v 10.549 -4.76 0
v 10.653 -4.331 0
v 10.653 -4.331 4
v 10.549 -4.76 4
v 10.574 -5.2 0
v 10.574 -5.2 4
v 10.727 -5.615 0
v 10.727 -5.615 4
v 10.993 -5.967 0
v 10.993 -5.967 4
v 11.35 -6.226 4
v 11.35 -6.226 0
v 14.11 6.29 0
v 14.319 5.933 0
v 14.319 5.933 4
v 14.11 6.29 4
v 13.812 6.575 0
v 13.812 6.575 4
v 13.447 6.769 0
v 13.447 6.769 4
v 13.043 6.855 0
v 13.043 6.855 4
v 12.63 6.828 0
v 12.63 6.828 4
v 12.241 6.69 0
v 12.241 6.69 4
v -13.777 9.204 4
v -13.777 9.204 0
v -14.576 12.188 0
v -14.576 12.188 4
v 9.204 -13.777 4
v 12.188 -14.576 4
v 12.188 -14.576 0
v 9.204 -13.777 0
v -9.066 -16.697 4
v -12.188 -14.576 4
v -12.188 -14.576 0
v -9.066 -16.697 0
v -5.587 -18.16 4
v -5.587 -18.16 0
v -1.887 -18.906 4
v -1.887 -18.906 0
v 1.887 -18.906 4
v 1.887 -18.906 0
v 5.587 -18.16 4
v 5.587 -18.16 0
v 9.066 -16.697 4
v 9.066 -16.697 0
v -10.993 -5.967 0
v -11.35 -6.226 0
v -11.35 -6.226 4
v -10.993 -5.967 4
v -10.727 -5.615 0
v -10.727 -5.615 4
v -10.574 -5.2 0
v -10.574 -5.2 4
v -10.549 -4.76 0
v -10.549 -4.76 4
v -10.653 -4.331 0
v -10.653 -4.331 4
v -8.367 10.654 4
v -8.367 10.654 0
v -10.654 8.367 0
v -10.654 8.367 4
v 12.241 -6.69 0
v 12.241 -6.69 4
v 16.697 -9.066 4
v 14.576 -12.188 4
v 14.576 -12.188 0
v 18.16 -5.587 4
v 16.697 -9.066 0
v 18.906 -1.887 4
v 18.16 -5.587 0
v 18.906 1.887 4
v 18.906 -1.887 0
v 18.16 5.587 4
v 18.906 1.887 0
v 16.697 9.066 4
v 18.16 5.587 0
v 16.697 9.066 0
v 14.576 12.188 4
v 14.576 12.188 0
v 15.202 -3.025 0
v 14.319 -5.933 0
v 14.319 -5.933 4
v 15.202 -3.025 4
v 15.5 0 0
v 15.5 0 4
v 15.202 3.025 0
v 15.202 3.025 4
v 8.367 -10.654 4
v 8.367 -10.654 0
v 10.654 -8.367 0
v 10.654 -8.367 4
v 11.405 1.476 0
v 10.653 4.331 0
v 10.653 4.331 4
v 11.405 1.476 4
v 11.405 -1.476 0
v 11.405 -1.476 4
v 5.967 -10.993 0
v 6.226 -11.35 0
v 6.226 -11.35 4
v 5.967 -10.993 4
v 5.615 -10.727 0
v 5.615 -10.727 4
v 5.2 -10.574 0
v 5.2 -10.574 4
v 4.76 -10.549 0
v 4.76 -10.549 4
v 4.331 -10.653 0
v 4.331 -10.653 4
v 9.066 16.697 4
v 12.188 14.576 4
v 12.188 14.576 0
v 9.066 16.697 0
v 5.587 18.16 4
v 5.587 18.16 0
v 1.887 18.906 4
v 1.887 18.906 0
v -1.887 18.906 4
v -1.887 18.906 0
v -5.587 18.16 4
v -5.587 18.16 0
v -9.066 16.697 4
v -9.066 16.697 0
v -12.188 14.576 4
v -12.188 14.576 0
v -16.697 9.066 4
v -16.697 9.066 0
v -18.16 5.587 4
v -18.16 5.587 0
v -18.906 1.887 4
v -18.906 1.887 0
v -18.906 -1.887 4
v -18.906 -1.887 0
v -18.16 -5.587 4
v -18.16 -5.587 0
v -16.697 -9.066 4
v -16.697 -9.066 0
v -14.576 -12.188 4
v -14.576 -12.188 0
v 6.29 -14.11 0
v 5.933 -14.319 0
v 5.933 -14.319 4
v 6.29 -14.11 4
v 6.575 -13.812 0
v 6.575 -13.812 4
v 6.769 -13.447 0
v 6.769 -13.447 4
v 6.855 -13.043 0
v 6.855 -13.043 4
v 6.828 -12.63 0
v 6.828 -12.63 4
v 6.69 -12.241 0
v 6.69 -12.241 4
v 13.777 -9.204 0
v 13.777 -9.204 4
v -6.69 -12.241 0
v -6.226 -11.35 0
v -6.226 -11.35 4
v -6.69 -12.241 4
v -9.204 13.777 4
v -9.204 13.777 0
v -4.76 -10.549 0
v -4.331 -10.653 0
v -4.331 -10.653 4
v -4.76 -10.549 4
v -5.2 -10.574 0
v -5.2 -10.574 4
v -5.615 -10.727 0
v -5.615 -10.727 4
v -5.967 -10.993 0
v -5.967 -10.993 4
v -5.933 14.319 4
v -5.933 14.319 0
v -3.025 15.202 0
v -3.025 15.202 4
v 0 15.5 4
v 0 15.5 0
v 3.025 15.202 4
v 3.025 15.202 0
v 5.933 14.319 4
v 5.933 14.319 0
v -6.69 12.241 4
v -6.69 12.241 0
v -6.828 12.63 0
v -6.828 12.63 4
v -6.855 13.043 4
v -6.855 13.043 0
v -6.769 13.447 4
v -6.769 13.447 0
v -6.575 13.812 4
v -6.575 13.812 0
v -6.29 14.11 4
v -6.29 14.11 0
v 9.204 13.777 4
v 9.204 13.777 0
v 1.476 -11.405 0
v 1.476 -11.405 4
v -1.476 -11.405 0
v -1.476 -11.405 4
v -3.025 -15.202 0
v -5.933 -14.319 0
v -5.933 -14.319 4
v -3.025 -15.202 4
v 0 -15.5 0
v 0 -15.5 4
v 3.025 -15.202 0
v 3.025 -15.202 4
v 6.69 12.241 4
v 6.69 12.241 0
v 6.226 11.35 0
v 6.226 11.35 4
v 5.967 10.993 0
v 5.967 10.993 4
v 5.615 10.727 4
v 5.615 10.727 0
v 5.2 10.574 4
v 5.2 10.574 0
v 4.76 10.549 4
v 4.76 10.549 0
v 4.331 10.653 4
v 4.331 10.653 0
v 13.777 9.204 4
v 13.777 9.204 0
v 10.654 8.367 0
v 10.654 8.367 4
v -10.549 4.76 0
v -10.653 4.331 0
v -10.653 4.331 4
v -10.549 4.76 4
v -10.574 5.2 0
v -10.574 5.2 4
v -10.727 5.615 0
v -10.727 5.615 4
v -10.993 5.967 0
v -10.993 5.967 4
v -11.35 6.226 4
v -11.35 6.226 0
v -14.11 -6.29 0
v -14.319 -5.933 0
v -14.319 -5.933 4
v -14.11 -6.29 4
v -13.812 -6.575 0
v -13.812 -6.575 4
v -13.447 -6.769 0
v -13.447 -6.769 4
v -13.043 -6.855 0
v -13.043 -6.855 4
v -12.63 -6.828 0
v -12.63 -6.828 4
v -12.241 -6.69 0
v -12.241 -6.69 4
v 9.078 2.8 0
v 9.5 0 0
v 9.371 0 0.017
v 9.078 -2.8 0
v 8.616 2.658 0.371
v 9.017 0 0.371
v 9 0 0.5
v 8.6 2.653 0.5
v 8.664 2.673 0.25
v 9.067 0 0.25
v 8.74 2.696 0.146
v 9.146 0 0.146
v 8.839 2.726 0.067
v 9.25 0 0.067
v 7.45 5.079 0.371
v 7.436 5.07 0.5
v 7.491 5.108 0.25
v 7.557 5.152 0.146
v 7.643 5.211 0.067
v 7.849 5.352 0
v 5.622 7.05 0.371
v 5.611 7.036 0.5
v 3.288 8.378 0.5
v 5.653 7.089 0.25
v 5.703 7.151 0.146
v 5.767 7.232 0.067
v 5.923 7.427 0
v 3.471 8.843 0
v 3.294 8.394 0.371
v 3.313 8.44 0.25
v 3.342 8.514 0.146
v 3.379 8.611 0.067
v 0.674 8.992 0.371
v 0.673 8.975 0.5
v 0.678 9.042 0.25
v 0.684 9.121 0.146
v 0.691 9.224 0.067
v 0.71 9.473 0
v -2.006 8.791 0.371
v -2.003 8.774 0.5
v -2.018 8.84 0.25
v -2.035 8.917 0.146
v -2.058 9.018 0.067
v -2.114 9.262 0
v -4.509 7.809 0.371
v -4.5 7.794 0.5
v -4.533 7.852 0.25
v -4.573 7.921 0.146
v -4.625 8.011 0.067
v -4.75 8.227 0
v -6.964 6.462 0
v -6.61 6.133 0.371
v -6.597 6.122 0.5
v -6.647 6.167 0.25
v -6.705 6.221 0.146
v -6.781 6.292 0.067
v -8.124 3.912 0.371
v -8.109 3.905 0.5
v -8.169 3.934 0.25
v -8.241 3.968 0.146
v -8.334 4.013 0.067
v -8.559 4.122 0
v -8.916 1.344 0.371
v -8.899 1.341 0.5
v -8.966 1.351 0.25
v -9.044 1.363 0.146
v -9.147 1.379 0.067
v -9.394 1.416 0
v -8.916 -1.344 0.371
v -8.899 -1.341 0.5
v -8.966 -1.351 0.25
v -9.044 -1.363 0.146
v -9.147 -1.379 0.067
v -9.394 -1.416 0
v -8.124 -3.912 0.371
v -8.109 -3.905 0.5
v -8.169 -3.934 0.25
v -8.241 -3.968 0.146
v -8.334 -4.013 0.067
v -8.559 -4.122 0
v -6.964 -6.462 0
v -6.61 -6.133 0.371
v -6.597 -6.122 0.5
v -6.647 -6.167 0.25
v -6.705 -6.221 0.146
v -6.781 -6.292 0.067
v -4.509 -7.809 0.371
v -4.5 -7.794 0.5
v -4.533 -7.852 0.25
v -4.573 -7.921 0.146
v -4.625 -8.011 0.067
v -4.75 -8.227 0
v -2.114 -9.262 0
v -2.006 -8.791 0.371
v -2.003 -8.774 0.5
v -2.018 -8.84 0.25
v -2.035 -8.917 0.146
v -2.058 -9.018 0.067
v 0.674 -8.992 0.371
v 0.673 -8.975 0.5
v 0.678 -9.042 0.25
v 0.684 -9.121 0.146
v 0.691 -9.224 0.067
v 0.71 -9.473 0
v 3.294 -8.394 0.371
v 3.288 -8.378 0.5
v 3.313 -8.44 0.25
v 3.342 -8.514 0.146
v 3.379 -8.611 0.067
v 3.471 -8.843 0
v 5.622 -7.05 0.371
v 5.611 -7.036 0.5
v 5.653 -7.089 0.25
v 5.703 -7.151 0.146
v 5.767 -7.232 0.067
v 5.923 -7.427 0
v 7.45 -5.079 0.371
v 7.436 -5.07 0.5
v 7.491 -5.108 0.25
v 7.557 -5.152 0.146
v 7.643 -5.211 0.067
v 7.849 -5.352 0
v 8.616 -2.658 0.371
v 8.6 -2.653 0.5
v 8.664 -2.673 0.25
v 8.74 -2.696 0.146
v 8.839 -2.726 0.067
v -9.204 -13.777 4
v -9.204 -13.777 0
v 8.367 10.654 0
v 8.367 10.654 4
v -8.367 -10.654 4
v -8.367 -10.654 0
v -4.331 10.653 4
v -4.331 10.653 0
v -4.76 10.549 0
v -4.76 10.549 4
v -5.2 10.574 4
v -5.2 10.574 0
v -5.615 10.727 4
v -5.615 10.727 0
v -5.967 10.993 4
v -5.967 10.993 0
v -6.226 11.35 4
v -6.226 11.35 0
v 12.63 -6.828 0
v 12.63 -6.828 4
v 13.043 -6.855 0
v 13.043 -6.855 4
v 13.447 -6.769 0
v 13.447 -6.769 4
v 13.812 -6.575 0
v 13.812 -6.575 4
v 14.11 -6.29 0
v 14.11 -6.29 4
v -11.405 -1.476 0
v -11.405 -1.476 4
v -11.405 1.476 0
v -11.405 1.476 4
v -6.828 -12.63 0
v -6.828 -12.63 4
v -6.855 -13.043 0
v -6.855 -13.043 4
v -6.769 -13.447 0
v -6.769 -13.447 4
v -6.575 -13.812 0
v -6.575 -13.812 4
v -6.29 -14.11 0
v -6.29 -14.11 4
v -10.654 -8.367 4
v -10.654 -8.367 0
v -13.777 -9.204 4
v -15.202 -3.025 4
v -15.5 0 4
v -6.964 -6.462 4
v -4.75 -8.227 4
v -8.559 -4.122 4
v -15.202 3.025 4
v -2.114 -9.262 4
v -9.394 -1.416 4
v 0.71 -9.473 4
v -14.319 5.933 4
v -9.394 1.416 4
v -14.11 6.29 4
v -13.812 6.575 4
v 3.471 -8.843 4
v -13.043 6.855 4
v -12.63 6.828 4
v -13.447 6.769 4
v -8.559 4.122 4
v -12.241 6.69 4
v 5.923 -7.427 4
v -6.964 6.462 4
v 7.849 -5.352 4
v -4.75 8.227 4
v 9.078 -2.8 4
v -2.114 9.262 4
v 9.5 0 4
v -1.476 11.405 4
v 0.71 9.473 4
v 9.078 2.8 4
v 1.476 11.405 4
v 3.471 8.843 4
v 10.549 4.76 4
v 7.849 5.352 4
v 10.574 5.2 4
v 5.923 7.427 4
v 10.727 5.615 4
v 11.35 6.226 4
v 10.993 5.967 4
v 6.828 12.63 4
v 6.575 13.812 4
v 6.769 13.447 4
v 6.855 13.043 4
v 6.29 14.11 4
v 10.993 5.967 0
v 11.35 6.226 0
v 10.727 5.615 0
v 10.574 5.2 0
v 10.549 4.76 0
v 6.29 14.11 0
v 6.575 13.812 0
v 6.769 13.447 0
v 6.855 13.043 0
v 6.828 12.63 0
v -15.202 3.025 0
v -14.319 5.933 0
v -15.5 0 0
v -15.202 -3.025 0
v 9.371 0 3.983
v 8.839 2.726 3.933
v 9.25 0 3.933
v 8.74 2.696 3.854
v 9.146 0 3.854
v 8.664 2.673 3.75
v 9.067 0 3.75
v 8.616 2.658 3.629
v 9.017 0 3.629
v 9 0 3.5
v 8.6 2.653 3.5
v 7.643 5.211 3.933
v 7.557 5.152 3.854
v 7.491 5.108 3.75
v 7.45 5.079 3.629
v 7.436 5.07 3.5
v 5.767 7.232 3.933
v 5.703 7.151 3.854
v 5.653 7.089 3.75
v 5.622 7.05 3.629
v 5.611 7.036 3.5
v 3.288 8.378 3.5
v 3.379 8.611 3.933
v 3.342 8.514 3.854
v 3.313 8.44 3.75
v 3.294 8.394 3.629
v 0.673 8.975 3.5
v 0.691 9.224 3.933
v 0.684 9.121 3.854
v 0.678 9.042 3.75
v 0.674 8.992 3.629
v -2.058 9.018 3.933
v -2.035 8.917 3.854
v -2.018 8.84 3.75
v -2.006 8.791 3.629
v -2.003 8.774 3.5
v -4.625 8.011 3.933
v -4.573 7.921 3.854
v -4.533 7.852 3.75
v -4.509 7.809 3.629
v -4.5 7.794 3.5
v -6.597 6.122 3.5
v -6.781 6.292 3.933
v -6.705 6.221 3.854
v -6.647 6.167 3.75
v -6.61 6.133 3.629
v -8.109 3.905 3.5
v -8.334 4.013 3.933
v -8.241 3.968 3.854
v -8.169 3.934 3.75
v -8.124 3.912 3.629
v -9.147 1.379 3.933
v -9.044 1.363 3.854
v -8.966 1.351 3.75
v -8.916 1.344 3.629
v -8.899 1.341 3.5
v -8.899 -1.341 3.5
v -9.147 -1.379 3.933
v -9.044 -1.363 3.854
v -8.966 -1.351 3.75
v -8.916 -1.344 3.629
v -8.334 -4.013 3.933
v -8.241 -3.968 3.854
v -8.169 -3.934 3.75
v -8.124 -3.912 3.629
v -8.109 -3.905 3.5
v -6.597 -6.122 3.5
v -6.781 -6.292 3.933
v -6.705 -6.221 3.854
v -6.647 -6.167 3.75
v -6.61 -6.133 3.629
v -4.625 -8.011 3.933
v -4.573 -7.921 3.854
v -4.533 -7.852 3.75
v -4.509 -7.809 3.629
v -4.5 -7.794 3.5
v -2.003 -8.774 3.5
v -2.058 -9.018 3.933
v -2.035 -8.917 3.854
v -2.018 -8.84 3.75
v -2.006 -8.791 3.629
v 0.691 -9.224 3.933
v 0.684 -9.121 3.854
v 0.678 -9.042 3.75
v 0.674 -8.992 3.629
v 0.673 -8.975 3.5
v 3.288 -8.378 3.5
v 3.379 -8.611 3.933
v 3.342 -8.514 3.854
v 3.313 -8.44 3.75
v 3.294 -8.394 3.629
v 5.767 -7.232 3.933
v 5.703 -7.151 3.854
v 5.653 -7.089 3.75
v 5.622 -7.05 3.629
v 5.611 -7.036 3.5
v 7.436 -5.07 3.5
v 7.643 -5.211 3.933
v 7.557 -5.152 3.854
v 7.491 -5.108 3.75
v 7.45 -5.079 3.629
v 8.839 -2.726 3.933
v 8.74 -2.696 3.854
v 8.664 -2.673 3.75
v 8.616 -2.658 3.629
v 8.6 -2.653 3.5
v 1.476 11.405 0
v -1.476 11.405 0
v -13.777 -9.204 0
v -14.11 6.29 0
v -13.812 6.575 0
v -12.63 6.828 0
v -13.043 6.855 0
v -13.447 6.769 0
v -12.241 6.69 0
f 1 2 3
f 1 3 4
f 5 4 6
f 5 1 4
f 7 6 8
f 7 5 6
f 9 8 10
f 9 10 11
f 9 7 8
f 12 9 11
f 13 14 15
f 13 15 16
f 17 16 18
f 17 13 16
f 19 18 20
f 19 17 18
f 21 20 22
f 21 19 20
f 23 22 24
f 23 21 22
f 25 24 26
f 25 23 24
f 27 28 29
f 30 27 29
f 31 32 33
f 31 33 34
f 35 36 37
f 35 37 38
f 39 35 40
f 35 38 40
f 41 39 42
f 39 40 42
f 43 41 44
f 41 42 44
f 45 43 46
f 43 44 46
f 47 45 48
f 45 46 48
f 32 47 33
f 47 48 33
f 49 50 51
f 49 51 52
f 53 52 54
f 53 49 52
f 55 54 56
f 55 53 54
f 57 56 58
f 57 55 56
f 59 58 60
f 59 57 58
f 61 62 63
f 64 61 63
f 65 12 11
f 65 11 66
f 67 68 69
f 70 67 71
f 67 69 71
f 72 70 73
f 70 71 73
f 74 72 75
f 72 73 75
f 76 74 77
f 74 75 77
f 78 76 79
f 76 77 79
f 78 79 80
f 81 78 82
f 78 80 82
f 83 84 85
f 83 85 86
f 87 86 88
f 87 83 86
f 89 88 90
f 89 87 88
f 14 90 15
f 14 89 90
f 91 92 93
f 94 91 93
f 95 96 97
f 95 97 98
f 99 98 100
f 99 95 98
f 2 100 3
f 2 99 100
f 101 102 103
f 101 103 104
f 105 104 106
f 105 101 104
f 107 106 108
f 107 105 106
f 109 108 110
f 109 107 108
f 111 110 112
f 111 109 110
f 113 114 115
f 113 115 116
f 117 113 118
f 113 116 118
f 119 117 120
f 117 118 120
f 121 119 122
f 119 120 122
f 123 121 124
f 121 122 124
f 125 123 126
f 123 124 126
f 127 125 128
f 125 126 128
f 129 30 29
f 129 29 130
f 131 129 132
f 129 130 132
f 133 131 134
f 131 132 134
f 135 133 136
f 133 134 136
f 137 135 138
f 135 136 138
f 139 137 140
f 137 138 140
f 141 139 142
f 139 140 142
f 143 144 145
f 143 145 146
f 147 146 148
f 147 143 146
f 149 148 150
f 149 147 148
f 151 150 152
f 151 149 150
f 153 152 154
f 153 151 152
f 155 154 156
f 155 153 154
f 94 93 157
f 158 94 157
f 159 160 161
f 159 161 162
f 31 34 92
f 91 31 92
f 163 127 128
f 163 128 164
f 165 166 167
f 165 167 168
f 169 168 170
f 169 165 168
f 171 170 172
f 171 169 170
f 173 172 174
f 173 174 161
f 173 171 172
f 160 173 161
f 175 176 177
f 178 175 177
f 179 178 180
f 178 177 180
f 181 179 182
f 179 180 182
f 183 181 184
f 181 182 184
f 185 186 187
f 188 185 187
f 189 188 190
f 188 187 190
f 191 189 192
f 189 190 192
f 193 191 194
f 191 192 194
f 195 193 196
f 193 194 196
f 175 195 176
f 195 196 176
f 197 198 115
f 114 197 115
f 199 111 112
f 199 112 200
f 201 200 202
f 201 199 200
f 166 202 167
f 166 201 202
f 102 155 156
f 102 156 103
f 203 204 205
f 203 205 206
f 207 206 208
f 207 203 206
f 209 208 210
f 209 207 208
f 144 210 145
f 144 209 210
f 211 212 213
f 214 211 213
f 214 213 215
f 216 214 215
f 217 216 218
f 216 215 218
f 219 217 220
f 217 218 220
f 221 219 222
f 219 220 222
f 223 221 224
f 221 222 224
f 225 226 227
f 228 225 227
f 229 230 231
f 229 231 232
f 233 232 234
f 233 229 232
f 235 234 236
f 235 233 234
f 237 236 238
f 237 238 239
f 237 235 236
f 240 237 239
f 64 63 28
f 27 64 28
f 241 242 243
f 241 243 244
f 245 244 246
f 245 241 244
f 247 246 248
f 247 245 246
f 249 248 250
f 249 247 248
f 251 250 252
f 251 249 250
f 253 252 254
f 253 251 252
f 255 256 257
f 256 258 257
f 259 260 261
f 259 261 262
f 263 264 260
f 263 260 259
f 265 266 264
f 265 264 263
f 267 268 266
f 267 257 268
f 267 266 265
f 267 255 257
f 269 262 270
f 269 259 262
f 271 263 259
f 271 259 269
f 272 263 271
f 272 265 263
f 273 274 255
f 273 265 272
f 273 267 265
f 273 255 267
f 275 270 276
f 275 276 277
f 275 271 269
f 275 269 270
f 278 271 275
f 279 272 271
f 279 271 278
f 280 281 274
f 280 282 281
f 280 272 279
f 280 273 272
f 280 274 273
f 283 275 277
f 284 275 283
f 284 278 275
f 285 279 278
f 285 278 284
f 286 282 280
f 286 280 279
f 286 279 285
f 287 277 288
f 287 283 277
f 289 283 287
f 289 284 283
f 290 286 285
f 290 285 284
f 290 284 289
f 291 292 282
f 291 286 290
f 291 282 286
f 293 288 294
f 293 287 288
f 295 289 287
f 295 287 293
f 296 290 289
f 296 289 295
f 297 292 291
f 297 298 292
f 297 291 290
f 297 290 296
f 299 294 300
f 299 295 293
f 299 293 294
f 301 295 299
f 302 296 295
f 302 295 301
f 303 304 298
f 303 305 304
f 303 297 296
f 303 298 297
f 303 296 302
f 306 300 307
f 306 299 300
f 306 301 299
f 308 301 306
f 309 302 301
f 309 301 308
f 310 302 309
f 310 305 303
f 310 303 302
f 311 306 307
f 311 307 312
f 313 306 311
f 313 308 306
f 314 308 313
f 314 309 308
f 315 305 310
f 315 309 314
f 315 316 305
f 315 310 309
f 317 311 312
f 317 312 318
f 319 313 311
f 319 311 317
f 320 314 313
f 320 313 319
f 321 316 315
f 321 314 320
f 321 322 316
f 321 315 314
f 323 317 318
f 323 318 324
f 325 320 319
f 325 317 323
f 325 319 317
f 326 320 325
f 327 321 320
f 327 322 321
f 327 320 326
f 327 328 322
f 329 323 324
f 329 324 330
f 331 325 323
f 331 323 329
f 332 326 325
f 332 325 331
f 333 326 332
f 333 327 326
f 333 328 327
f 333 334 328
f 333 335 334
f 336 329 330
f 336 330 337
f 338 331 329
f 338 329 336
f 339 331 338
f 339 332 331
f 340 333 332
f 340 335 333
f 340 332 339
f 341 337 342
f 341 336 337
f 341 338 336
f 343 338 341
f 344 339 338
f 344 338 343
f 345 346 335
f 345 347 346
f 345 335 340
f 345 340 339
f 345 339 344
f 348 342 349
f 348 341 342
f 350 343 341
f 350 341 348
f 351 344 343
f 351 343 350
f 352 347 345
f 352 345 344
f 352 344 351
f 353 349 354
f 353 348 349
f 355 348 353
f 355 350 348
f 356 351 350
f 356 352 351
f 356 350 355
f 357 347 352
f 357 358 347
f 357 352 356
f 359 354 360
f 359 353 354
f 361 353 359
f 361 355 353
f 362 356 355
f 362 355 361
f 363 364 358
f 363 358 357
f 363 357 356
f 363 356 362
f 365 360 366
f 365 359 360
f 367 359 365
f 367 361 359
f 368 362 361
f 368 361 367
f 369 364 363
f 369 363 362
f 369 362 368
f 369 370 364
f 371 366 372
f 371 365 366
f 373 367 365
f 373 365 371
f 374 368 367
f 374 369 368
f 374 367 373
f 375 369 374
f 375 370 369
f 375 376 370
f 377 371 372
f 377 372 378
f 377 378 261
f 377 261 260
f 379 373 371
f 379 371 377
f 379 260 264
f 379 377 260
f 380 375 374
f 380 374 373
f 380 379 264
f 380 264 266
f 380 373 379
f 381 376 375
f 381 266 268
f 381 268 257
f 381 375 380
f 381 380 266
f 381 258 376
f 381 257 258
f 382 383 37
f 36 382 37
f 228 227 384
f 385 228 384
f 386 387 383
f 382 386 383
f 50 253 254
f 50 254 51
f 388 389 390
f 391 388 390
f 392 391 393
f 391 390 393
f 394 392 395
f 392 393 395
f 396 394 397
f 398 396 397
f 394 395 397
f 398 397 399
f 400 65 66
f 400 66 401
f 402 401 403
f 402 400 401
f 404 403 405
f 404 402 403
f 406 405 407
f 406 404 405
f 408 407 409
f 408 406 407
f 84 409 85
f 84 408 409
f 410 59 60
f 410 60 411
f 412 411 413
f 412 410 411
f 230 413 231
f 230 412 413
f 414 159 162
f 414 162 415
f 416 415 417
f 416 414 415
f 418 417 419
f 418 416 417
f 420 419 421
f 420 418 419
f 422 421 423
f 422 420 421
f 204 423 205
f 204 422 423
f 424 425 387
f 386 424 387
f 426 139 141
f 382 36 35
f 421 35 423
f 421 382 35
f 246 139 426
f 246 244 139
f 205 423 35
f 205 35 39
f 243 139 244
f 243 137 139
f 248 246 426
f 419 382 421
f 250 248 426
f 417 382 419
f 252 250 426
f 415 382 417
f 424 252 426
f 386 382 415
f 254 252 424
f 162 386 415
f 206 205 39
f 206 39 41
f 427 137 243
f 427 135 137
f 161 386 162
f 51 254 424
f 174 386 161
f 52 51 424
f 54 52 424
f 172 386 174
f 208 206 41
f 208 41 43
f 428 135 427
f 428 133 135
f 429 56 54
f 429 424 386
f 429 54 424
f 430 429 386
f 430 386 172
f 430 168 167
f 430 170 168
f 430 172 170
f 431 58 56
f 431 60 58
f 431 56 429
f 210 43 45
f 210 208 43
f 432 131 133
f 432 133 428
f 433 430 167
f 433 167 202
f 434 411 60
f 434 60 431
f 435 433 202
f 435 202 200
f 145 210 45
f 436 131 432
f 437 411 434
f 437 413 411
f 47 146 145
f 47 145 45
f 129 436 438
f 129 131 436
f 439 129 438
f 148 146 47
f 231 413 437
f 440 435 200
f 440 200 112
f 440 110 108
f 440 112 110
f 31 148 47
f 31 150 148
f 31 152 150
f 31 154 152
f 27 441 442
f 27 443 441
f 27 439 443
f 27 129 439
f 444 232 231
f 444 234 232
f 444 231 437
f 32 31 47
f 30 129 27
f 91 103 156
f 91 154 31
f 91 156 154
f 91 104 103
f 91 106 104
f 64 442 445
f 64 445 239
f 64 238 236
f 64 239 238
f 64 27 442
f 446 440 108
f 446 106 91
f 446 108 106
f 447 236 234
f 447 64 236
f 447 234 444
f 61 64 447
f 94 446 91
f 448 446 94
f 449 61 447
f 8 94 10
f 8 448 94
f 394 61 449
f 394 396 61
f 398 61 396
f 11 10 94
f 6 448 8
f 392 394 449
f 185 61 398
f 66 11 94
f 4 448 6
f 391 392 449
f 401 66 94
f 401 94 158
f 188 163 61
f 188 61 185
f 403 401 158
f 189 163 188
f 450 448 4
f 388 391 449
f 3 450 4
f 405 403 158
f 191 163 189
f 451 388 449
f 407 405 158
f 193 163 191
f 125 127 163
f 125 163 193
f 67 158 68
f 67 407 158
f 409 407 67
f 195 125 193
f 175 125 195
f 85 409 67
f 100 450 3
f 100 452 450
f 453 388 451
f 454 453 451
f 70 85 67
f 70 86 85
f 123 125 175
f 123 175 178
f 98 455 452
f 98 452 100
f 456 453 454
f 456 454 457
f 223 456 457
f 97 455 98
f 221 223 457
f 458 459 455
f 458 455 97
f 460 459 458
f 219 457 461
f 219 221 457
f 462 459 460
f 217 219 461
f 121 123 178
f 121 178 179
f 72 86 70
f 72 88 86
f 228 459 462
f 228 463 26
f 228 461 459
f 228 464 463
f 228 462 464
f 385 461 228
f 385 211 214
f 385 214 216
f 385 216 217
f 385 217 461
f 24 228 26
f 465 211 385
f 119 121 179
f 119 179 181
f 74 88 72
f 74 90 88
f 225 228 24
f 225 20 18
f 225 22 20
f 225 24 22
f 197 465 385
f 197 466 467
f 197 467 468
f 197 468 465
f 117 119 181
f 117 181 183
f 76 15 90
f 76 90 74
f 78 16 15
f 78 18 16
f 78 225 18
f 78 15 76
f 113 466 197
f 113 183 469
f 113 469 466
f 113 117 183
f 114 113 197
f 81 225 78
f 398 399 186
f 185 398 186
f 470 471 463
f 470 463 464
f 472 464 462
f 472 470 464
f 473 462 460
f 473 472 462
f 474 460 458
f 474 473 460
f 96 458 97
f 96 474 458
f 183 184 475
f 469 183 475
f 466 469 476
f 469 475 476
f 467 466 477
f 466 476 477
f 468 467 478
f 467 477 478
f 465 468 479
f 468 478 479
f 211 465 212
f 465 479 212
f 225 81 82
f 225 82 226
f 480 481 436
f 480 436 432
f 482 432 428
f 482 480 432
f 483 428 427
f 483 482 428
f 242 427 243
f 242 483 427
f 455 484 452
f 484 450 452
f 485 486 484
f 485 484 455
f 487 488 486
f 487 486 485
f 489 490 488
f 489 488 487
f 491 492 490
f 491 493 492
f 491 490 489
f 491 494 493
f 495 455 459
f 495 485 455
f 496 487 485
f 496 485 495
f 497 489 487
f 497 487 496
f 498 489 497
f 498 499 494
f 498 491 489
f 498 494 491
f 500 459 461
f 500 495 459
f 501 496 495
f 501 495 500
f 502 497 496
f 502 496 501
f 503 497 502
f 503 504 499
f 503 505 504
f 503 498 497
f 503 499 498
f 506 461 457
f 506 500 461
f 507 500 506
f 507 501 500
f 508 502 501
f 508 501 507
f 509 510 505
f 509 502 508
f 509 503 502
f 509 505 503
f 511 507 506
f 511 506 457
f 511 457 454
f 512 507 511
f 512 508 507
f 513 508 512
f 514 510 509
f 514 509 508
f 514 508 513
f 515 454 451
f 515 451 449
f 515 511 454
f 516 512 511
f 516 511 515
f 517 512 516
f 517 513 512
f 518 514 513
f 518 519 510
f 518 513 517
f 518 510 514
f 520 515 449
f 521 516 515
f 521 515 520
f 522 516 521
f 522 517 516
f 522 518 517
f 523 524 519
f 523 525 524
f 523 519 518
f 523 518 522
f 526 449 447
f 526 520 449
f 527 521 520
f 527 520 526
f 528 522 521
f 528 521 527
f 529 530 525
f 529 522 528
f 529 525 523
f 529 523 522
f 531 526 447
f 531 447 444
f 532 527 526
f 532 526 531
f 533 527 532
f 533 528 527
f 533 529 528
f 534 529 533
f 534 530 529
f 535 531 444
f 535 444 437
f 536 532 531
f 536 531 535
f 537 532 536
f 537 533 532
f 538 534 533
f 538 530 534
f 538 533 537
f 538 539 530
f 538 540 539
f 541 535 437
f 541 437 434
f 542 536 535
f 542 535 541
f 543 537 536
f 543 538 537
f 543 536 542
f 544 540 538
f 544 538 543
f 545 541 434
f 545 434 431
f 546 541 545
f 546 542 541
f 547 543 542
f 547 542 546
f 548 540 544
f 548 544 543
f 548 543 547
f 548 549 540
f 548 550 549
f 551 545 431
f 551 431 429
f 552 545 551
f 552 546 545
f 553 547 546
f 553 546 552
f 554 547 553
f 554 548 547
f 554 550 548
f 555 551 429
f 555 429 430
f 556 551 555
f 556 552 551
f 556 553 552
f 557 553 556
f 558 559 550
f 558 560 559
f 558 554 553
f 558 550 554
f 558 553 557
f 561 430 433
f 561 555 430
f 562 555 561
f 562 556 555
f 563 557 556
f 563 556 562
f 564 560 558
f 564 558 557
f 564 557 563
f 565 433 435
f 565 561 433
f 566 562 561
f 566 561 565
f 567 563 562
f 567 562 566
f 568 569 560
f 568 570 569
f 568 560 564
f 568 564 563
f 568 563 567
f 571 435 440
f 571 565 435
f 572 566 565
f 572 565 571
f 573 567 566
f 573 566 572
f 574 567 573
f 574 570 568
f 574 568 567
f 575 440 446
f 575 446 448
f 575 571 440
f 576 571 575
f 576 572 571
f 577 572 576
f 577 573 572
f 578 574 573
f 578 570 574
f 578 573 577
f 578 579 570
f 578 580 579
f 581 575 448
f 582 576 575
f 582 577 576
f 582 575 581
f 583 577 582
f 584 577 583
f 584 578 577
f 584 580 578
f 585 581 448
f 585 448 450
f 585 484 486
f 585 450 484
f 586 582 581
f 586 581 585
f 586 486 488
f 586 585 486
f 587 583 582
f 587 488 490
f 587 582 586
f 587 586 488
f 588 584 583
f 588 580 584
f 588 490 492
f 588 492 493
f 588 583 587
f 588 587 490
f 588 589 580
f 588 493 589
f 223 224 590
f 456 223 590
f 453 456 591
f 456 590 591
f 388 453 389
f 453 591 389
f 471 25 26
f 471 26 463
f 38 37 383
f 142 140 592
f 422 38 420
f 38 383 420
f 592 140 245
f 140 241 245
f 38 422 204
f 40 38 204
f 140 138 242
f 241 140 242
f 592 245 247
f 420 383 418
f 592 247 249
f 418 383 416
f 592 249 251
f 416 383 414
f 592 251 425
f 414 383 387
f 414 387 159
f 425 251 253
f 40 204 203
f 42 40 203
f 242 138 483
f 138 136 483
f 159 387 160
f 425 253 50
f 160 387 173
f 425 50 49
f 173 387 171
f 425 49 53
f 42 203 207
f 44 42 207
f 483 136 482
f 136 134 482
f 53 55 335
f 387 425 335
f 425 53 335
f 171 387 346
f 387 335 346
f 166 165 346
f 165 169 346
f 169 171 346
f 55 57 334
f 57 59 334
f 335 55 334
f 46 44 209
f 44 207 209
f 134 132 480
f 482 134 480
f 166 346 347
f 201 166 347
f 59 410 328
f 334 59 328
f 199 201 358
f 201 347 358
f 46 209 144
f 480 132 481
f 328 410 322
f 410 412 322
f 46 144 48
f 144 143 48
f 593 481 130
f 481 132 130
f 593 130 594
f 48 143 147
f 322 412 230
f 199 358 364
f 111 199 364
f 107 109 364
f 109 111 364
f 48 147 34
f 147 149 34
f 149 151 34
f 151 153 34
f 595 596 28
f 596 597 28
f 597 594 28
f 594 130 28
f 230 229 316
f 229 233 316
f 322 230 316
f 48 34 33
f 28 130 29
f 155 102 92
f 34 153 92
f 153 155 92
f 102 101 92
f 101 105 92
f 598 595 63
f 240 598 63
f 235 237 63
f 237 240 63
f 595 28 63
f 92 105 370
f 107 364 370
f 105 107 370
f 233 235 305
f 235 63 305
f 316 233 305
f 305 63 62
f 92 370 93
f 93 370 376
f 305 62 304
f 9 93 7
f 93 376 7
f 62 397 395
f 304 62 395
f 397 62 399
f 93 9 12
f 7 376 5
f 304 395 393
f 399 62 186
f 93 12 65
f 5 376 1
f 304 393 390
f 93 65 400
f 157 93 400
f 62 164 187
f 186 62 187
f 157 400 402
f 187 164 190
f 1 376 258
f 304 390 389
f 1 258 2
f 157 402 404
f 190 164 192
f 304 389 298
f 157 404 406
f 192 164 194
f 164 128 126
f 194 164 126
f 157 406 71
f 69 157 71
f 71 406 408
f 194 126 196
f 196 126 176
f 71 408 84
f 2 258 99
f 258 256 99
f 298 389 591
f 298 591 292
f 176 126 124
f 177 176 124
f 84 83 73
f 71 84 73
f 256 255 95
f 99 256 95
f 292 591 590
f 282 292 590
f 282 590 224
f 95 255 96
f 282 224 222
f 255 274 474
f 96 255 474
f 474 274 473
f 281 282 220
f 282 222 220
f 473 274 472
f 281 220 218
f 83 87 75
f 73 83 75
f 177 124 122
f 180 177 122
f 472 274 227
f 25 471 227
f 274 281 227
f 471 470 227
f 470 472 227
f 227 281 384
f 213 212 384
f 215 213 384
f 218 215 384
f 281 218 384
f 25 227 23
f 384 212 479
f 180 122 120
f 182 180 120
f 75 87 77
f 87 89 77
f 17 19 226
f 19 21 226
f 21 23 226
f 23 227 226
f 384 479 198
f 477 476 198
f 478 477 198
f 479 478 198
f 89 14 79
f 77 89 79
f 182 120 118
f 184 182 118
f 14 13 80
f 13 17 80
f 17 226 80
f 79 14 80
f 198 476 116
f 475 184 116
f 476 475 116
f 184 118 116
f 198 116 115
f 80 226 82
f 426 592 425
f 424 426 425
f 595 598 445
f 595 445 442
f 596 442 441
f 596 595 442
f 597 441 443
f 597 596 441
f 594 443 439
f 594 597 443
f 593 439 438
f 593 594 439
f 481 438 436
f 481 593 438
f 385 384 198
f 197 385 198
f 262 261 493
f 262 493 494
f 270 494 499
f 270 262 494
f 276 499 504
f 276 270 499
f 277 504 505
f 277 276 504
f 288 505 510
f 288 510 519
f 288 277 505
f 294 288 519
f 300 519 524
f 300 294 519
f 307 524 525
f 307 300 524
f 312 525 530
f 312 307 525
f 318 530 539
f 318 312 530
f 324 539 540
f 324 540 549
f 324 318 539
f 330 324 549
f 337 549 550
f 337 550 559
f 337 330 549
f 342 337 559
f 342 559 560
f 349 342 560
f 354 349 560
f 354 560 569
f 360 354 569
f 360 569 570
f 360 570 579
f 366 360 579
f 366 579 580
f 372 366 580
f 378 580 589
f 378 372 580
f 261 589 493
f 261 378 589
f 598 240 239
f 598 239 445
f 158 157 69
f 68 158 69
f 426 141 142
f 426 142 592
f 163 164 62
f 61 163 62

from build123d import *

# Parameters (mm, degrees)
SKETCH1_R           = 19
SKETCH1_R_2         = 9
BOSS_EXTRUDE1_DEPTH = 4
CUT_EXTRUDE1_DEPTH  = 4
FILLET1_R           = 0.5


with BuildPart() as part:
    # Sketch1 → Boss-Extrude1 (new body)
    with BuildSketch(Plane.XY):
        Circle(SKETCH1_R)
        Circle(SKETCH1_R_2, mode=Mode.SUBTRACT)
        with BuildLine():
            Line((6.689691504, 12.241024694), (6.226047976, 11.350373764))
            ThreePointArc((6.226047976, 11.350373764), (5.41320923, 10.635157913), (4.330662681, 10.653420143))
            ThreePointArc((4.330662681, 10.653420143), (0, 11.5), (-4.330662681, 10.653420143))
            ThreePointArc((-4.330662681, 10.653420143), (-5.41320923, 10.635157913), (-6.226047976, 11.350373764))
            Line((-6.226047976, 11.350373764), (-6.689691504, 12.241024694))
            ThreePointArc((-6.689691504, 12.241024694), (-6.768746058, 13.446590252), (-5.933372603, 14.319395572))
            ThreePointArc((-5.933372603, 14.319395572), (0, 15.5), (5.933372603, 14.319395572))
            ThreePointArc((5.933372603, 14.319395572), (6.768746058, 13.446590252), (6.689691504, 12.241024694))
        make_face(mode=Mode.SUBTRACT)
        with BuildLine():
            Line((12.241024694, 6.689691504), (11.350373764, 6.226047976))
            ThreePointArc((11.350373764, 6.226047976), (10.635157913, 5.41320923), (10.653420143, 4.330662681))
            ThreePointArc((10.653420143, 4.330662681), (11.5, 0), (10.653420143, -4.330662681))
            ThreePointArc((10.653420143, -4.330662681), (10.635157913, -5.41320923), (11.350373764, -6.226047976))
            Line((11.350373764, -6.226047976), (12.241024694, -6.689691504))
            ThreePointArc((12.241024694, -6.689691504), (13.446590252, -6.768746058), (14.319395572, -5.933372603))
            ThreePointArc((14.319395572, -5.933372603), (15.5, 0), (14.319395572, 5.933372603))
            ThreePointArc((14.319395572, 5.933372603), (13.446590252, 6.768746058), (12.241024694, 6.689691504))
        make_face(mode=Mode.SUBTRACT)
        with BuildLine():
            Line((6.689691504, -12.241024694), (6.226047976, -11.350373764))
            ThreePointArc((6.226047976, -11.350373764), (5.41320923, -10.635157913), (4.330662681, -10.653420143))
            ThreePointArc((4.330662681, -10.653420143), (0, -11.5), (-4.330662681, -10.653420143))
            ThreePointArc((-4.330662681, -10.653420143), (-5.41320923, -10.635157913), (-6.226047976, -11.350373764))
            Line((-6.226047976, -11.350373764), (-6.689691504, -12.241024694))
            ThreePointArc((-6.689691504, -12.241024694), (-6.768746058, -13.446590252), (-5.933372603, -14.319395572))
            ThreePointArc((-5.933372603, -14.319395572), (0, -15.5), (5.933372603, -14.319395572))
            ThreePointArc((5.933372603, -14.319395572), (6.768746058, -13.446590252), (6.689691504, -12.241024694))
        make_face(mode=Mode.SUBTRACT)
        with BuildLine():
            Line((-12.241024694, -6.689691504), (-11.350373764, -6.226047976))
            ThreePointArc((-11.350373764, -6.226047976), (-10.635157913, -5.41320923), (-10.653420143, -4.330662681))
            ThreePointArc((-10.653420143, -4.330662681), (-11.5, 0), (-10.653420143, 4.330662681))
            ThreePointArc((-10.653420143, 4.330662681), (-10.635157913, 5.41320923), (-11.350373764, 6.226047976))
            Line((-11.350373764, 6.226047976), (-12.241024694, 6.689691504))
            ThreePointArc((-12.241024694, 6.689691504), (-13.446590252, 6.768746058), (-14.319395572, 5.933372603))
            ThreePointArc((-14.319395572, 5.933372603), (-15.5, 0), (-14.319395572, -5.933372603))
            ThreePointArc((-14.319395572, -5.933372603), (-13.446590252, -6.768746058), (-12.241024694, -6.689691504))
        make_face(mode=Mode.SUBTRACT)
    extrude(amount=BOSS_EXTRUDE1_DEPTH)

    # Sketch2 → Cut-Extrude1 (cut)
    with BuildSketch(Plane(origin=(0, 0, 0), x_dir=(-1, 0, 0), z_dir=(0, 0, -1))):
        Polygon((10.65368142, -8.367490994), (8.367490994, -10.65368142), (9.204294768, -13.776675621), (12.327288968, -14.613479395), (14.613479395, -12.327288968), (13.776675621, -9.204294768), align=None)
        Polygon((13.776675621, 9.204294768), (14.613479395, 12.327288968), (12.327288968, 14.613479395), (9.204294768, 13.776675621), (8.367490994, 10.65368142), (10.65368142, 8.367490994), align=None)
        Polygon((-8.367490994, -10.65368142), (-10.65368142, -8.367490994), (-13.776675621, -9.204294768), (-14.613479395, -12.327288968), (-12.327288968, -14.613479395), (-9.204294768, -13.776675621), align=None)
        Polygon((-10.65368142, 8.367490994), (-8.367490994, 10.65368142), (-9.204294768, 13.776675621), (-12.327288968, 14.613479395), (-14.613479395, 12.327288968), (-13.776675621, 9.204294768), align=None)
    extrude(amount=-CUT_EXTRUDE1_DEPTH, mode=Mode.SUBTRACT)

    # Fillet1
    fillet1_edges = [part.edges().sort_by_distance(p)[0] for p in [
        (-9, 0, 0),
        (-9, 0, 4),
    ]]
    fillet(fillet1_edges, radius=FILLET1_R)


solid = part.part
